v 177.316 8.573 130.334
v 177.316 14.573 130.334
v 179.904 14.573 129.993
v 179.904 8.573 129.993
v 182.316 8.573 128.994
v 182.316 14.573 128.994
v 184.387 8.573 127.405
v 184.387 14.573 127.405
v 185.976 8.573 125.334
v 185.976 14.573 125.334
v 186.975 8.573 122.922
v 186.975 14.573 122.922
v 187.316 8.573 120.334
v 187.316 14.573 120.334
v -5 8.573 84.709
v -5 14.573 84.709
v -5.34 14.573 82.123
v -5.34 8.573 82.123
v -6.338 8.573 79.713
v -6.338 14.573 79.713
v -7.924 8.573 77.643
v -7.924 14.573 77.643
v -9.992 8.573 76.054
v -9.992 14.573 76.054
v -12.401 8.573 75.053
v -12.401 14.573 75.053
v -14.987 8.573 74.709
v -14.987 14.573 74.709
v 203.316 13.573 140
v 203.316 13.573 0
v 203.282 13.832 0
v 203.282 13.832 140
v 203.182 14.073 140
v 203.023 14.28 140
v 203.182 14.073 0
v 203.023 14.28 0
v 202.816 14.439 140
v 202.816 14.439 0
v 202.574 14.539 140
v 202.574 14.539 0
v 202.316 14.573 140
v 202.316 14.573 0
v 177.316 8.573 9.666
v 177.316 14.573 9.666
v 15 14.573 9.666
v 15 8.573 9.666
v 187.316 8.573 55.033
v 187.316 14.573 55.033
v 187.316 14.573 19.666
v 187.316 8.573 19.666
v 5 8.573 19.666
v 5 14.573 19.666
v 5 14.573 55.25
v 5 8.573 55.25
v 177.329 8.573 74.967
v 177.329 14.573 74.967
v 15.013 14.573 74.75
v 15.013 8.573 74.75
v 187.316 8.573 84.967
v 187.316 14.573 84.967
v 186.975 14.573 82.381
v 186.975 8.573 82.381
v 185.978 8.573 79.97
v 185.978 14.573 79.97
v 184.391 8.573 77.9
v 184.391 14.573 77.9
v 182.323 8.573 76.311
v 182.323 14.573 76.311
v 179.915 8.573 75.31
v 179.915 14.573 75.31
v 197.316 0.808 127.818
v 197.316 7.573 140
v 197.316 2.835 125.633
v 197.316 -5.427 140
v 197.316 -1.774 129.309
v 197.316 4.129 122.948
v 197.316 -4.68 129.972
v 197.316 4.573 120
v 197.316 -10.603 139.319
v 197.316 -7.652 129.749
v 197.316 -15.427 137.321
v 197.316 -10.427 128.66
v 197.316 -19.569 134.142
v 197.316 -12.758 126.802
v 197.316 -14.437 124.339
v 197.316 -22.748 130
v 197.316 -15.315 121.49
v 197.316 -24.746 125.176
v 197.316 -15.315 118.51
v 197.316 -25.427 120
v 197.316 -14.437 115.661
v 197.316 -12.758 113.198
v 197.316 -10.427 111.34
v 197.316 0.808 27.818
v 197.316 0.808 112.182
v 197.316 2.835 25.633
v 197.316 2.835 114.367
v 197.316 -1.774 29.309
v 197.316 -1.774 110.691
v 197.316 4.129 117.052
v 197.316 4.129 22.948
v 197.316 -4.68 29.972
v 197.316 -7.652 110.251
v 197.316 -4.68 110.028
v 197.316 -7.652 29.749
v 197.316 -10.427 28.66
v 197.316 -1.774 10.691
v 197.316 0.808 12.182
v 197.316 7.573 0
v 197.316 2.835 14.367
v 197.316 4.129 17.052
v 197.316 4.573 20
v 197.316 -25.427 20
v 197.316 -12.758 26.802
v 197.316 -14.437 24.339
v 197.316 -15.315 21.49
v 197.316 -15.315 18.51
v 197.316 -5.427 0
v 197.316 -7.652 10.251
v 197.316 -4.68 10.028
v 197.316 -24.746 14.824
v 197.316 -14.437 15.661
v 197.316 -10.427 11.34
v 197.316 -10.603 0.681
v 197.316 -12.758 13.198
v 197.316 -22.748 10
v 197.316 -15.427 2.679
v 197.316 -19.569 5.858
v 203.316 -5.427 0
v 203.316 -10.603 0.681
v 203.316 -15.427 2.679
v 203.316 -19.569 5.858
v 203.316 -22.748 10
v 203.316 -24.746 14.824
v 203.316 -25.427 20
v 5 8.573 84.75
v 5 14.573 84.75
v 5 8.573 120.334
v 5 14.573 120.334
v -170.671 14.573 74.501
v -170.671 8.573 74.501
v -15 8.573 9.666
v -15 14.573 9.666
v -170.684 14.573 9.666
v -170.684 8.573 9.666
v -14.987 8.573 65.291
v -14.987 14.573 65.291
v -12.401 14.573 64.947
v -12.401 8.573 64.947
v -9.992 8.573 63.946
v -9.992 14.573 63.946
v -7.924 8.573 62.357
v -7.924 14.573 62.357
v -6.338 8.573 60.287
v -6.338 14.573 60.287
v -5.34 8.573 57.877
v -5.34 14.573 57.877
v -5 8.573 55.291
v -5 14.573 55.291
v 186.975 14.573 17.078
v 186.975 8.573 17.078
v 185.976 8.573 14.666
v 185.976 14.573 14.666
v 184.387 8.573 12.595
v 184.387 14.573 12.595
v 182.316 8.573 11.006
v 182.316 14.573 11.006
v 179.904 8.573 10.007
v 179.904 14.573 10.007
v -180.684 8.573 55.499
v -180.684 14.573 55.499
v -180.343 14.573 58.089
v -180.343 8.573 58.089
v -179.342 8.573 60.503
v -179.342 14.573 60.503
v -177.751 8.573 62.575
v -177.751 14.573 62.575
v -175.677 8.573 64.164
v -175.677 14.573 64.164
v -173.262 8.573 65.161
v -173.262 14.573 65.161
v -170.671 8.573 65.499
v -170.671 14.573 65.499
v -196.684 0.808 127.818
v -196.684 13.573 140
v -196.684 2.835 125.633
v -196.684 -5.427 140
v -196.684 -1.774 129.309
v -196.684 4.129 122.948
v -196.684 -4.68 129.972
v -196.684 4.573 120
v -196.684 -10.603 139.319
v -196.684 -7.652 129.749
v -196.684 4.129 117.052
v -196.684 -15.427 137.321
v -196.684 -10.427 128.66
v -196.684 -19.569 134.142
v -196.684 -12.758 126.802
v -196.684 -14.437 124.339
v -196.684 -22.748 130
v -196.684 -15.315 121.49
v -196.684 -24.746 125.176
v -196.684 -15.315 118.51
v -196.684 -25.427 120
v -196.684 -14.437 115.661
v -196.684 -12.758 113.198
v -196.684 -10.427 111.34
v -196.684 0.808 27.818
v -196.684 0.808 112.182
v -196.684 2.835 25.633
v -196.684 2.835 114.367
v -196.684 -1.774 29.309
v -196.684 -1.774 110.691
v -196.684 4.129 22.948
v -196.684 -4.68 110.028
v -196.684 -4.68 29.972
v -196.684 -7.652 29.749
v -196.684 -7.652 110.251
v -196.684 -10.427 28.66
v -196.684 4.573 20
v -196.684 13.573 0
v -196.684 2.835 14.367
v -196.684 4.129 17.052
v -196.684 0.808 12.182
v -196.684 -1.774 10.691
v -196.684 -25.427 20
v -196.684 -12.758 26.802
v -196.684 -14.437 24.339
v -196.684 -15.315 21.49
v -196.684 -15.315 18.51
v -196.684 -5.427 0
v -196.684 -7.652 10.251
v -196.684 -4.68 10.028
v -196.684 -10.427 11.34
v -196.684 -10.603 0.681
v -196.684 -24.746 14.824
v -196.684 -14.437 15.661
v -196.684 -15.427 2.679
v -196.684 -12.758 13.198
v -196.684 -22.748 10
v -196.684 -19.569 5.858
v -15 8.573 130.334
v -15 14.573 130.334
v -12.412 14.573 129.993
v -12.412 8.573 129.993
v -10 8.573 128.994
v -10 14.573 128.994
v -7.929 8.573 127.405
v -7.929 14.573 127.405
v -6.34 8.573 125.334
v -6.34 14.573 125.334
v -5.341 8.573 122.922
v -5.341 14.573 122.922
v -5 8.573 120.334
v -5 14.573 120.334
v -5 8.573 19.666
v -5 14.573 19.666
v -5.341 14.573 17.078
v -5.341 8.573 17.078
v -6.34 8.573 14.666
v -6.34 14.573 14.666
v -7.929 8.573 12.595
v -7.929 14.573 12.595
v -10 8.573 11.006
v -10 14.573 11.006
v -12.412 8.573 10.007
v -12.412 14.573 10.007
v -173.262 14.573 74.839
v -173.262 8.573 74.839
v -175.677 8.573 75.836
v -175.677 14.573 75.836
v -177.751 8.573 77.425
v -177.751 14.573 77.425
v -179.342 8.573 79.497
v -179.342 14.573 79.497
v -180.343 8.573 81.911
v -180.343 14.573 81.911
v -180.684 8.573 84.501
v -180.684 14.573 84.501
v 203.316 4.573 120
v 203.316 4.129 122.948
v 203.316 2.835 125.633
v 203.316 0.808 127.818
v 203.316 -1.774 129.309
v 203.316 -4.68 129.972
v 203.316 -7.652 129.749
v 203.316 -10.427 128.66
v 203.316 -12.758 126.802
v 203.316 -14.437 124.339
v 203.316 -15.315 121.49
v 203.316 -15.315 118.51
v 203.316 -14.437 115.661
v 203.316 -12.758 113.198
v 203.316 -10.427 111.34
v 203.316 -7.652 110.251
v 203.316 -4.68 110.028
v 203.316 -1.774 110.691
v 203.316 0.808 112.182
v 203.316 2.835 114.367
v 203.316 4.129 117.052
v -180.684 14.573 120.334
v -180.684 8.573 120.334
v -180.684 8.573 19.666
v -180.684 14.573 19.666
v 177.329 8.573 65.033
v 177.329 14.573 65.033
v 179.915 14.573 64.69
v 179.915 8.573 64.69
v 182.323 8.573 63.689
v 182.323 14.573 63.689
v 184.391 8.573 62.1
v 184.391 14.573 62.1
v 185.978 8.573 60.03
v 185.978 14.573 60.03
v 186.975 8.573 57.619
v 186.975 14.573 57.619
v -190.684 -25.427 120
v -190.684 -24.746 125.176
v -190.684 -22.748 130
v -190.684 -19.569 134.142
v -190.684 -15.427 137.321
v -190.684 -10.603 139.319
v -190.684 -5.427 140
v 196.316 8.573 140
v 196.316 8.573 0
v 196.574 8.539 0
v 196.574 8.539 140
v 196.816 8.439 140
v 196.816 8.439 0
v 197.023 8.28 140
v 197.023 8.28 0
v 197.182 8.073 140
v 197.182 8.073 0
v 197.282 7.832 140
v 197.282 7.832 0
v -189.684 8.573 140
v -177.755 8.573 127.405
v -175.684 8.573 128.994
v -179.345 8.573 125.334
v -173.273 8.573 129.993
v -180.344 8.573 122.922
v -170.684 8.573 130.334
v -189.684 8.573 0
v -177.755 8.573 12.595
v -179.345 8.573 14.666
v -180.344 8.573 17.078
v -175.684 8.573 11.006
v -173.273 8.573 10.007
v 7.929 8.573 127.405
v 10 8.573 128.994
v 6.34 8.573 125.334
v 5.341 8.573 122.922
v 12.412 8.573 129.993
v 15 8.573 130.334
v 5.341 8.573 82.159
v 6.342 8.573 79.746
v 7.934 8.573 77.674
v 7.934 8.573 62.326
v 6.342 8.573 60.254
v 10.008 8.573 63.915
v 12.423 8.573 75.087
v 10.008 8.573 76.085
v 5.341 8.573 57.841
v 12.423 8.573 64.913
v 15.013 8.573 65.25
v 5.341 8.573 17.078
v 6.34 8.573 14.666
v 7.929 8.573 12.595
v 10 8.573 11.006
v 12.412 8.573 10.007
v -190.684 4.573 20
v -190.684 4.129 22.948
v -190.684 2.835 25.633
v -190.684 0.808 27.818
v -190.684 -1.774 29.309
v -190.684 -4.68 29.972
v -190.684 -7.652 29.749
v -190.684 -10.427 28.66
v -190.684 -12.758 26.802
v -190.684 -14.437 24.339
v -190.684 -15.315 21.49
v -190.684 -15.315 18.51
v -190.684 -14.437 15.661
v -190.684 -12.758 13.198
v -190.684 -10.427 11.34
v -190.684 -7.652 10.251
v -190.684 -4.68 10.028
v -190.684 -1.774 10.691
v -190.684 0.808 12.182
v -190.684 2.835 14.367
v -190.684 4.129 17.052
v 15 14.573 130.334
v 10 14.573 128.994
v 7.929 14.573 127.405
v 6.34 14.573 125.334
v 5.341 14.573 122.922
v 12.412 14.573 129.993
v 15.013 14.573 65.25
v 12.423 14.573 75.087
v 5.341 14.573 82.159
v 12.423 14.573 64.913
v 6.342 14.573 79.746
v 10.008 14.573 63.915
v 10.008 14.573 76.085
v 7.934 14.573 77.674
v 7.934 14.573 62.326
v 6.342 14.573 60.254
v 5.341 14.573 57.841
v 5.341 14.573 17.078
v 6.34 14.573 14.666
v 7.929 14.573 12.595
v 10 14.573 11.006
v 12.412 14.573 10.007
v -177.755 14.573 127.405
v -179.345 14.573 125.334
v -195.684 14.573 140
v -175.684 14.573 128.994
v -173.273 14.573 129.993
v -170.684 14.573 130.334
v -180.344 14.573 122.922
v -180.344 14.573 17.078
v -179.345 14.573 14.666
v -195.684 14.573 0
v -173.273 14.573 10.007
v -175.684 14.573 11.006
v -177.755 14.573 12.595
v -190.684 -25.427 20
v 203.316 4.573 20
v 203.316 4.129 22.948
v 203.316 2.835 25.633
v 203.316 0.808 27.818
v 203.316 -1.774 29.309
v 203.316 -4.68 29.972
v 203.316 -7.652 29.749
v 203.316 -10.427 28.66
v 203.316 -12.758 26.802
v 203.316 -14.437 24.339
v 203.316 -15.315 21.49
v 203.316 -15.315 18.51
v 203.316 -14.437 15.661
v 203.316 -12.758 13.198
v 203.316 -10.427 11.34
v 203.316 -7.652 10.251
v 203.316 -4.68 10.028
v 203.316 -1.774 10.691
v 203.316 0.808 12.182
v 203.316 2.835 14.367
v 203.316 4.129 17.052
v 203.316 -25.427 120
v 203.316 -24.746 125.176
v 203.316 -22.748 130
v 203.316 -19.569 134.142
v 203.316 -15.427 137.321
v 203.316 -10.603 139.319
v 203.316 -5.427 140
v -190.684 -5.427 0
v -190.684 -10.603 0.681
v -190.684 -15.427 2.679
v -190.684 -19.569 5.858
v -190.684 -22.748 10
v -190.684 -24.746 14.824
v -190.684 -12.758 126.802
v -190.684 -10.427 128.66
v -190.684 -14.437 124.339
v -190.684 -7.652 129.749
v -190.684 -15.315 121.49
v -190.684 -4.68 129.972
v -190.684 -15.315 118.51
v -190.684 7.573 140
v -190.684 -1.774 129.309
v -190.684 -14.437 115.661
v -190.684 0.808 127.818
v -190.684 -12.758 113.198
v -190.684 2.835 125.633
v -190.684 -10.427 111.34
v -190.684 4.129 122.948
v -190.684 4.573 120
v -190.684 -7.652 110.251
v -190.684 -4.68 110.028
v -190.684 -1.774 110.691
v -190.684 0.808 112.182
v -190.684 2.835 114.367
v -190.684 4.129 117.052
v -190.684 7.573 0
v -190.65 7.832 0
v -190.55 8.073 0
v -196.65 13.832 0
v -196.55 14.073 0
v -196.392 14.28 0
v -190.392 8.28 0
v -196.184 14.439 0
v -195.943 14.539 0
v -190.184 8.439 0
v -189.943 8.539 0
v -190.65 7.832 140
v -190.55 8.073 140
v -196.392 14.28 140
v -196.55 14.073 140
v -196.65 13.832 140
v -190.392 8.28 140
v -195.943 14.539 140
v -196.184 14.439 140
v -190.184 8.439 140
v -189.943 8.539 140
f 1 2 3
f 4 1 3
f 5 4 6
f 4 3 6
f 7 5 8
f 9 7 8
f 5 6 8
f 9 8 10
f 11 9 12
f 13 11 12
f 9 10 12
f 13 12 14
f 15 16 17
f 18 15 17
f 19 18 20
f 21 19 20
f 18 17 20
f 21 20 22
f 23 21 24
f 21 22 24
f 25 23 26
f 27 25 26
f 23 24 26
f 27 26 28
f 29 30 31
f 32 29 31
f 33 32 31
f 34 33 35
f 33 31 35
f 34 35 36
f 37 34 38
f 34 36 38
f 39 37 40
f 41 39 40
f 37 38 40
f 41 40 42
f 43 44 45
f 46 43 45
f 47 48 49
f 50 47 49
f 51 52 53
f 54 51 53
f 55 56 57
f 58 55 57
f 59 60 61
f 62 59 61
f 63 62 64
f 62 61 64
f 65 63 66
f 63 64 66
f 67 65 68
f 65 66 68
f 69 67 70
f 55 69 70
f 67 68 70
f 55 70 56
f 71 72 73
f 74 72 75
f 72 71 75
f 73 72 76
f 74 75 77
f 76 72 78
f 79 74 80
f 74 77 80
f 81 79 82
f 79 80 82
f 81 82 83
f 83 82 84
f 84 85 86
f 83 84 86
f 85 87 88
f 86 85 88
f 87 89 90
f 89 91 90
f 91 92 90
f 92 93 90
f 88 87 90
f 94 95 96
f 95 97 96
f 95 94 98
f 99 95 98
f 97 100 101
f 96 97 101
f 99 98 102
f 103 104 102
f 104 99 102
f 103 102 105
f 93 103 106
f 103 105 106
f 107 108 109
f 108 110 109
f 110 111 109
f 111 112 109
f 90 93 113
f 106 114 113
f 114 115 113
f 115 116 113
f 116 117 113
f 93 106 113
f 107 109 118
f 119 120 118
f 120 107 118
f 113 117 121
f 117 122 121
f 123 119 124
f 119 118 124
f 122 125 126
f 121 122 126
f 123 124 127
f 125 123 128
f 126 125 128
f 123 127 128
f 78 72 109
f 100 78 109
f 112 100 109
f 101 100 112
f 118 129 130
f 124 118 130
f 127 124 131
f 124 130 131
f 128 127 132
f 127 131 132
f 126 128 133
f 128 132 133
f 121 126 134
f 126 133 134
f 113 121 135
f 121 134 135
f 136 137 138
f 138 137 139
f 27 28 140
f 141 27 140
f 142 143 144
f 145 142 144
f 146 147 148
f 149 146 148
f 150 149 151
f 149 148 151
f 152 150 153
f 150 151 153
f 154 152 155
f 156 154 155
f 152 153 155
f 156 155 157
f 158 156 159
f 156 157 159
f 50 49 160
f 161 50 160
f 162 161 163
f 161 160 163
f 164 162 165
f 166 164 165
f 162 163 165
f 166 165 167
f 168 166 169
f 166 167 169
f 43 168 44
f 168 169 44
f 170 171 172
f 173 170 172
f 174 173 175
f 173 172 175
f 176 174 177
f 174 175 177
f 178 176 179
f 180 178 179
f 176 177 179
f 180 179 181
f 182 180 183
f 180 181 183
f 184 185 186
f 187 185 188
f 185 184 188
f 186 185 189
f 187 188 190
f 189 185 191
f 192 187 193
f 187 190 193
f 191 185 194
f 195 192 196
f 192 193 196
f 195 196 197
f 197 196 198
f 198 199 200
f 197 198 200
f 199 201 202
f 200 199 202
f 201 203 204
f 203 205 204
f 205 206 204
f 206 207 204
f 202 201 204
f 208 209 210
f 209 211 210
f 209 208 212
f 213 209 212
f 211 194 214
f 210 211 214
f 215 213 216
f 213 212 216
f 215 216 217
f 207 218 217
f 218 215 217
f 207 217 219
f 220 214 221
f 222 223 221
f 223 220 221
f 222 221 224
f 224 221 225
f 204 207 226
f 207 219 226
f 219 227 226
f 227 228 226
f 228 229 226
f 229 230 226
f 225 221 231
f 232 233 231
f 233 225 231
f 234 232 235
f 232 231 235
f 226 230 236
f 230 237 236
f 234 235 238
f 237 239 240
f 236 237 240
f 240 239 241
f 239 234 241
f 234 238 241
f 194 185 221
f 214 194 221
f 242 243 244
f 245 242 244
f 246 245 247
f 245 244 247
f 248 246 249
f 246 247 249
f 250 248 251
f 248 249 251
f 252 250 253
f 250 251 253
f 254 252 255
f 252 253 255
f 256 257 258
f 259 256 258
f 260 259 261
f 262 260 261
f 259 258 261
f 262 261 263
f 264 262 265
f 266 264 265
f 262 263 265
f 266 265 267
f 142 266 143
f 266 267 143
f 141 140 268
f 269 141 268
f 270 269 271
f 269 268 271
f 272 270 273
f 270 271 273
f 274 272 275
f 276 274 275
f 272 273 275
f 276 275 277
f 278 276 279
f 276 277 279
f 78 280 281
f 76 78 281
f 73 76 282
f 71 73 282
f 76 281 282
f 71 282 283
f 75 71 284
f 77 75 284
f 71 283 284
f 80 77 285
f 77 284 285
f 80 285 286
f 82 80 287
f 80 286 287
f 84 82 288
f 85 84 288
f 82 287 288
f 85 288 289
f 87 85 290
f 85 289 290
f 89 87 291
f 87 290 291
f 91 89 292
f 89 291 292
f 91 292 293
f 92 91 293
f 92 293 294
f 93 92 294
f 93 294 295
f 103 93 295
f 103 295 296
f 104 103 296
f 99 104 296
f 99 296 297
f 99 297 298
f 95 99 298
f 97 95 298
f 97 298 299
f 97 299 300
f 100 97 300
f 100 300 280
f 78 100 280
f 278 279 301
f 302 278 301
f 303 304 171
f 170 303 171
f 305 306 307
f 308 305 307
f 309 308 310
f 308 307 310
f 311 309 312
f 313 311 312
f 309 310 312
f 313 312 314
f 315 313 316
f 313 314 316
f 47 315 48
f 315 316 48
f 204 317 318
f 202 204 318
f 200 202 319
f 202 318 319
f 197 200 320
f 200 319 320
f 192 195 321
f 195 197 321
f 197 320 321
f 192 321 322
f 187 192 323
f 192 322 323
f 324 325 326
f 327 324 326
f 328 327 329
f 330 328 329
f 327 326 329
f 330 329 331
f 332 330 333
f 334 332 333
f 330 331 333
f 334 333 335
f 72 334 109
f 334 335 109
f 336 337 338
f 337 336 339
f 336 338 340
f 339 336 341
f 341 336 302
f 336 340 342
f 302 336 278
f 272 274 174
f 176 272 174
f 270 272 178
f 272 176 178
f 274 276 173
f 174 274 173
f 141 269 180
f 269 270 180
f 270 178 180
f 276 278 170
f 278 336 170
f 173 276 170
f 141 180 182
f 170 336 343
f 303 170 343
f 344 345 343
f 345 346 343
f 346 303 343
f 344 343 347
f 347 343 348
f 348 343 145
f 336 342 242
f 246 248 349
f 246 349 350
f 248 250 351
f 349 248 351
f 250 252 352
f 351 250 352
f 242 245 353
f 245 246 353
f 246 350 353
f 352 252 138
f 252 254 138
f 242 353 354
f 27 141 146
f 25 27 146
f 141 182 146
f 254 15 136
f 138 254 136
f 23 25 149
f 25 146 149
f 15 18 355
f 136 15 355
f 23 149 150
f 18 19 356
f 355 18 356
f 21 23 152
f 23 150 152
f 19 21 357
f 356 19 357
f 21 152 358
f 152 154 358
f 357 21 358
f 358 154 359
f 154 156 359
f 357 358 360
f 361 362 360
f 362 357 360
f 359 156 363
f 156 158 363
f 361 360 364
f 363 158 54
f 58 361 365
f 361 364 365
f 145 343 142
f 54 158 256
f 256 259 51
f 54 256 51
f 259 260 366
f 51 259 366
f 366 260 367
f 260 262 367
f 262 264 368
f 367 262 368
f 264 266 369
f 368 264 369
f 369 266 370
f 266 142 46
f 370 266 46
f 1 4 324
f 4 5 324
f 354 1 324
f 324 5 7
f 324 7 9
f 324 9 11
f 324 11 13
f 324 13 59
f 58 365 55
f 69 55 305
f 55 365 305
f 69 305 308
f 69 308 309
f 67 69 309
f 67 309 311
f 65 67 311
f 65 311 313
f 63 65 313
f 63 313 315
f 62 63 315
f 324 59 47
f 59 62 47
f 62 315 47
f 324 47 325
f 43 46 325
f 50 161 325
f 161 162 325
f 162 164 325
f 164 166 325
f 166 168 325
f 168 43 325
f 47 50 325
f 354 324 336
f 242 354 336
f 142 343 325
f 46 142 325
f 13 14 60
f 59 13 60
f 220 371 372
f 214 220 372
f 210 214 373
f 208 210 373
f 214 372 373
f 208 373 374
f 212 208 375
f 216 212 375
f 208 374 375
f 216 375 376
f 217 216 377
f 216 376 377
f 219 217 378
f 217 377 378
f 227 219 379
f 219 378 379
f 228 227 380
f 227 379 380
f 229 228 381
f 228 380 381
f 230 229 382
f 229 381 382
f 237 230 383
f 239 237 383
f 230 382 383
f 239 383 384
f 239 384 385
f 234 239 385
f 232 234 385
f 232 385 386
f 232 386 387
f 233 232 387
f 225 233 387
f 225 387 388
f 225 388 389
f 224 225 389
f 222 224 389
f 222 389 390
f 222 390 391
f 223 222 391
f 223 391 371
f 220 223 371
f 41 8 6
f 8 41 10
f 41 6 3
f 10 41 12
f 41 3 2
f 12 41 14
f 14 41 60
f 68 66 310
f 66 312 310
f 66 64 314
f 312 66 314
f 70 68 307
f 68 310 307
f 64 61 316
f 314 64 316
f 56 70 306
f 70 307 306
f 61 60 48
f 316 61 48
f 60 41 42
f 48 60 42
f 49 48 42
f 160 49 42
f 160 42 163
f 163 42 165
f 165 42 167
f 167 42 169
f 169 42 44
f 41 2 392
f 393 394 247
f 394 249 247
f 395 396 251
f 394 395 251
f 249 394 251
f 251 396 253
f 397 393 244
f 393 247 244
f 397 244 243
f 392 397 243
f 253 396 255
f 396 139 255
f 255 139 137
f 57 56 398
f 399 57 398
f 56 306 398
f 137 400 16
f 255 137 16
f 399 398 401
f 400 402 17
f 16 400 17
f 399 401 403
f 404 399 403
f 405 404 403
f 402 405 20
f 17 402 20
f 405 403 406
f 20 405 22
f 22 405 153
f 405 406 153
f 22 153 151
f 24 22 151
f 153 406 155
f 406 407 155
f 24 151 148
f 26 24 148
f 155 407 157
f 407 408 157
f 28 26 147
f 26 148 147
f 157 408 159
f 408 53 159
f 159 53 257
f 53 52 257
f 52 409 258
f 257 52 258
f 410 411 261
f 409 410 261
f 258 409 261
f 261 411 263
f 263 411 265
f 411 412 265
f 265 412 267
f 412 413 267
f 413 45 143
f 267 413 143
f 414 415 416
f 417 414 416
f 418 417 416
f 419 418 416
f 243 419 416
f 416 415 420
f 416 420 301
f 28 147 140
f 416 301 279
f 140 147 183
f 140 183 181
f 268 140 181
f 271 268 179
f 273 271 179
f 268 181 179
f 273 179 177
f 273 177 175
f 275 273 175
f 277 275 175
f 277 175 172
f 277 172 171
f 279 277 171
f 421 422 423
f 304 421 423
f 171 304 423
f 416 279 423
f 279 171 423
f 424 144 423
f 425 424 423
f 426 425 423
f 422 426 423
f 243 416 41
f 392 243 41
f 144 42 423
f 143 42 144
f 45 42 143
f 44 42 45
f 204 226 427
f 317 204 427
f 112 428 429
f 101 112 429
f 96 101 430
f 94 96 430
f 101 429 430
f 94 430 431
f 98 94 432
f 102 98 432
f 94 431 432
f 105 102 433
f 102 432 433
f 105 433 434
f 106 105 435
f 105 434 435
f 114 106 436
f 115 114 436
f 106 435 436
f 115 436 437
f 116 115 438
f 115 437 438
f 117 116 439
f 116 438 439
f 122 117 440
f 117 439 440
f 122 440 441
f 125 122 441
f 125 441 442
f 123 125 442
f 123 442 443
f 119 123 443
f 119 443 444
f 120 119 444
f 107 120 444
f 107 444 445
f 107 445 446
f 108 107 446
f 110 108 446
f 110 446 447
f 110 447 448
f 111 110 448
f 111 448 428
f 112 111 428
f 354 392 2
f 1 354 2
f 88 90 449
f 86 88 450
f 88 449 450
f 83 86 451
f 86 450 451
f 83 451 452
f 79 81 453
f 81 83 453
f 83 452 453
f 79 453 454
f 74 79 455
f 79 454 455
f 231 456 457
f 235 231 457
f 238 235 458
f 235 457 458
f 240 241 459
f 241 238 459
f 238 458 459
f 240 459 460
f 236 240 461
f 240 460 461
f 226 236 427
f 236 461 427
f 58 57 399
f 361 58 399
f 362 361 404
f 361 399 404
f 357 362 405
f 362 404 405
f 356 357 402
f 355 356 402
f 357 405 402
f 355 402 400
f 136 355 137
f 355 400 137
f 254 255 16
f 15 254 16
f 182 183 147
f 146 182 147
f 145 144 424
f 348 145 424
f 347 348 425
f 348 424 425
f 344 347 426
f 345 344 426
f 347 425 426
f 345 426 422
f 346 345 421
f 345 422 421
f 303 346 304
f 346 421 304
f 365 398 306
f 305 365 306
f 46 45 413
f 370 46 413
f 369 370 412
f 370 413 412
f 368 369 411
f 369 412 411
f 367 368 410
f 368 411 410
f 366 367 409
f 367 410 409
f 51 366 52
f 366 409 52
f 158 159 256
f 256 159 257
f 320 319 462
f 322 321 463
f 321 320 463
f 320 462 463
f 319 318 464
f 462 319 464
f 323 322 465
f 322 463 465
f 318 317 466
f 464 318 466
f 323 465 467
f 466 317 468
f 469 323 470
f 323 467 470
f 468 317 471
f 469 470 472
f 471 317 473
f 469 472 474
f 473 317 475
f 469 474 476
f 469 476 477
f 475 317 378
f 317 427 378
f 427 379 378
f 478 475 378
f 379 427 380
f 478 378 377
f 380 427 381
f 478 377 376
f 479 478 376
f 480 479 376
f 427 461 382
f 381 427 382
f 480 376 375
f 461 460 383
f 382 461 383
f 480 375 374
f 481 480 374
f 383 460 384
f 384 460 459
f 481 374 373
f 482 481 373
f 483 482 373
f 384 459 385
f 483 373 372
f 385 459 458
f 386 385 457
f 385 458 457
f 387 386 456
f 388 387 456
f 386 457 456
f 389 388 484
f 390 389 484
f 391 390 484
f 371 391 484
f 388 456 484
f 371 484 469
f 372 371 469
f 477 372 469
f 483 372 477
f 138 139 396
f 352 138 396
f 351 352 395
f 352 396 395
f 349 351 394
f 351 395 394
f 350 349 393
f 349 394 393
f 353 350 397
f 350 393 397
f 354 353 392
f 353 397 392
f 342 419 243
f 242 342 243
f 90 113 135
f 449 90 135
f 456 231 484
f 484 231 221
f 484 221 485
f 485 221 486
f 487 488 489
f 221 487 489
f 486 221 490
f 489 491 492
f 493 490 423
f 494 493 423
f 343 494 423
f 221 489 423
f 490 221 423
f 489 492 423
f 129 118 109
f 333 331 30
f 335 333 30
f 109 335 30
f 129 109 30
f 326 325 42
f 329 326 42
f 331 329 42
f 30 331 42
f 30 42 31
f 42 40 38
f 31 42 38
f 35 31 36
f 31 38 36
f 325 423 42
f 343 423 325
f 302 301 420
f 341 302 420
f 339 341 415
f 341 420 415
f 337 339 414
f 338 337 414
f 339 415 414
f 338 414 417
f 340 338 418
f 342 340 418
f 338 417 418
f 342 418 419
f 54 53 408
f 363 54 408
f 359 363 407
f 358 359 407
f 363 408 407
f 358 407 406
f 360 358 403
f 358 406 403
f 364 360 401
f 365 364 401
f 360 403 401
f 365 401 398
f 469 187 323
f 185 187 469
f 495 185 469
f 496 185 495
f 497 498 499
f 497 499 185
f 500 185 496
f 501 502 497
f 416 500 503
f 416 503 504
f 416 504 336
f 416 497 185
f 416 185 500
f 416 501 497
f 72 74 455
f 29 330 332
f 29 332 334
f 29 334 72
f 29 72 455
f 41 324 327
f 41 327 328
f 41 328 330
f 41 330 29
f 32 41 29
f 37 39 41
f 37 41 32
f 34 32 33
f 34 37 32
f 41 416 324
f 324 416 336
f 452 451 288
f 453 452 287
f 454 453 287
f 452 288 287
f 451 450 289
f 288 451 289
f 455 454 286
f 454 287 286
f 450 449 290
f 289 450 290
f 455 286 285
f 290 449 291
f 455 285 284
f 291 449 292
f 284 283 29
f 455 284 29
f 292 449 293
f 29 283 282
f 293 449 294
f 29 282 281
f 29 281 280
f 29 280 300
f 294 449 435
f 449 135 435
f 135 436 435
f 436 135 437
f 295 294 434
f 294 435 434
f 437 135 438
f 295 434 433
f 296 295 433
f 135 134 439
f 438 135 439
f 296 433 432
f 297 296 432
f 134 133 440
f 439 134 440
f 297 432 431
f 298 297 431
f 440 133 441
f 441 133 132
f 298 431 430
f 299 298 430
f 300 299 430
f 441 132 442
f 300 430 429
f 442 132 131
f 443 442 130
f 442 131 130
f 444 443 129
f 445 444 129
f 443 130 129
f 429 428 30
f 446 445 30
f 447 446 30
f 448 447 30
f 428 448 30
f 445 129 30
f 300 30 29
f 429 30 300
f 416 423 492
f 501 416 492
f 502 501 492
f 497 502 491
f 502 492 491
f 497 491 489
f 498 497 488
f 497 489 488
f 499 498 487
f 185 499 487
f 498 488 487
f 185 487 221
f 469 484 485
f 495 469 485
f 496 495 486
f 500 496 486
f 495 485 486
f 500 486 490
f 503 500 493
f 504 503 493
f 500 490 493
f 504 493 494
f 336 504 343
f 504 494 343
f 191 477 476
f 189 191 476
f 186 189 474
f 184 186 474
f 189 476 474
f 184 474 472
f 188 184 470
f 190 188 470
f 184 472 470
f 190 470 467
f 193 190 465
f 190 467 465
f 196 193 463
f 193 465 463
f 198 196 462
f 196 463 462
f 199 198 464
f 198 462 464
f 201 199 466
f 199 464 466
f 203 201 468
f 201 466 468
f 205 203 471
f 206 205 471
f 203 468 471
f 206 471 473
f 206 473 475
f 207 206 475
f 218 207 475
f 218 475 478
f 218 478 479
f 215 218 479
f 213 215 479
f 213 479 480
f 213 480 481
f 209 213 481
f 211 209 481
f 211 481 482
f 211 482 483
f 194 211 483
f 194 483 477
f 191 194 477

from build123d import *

# Parameters (mm, degrees)
F1_DEPTH = 140
F2_R     = 10
F3_DEPTH = 400.001
F5_DEPTH = 40.001


with BuildPart() as f1:
    # F0 (on Top) → F1 (new body)
    with BuildSketch(Plane.XY):
        with BuildLine():
            Line((202.315605, 14.572916), (-195.684395, 14.572916))
            ThreePointArc((-195.684395, 14.572916), (-196.391502, 14.280022), (-196.684395, 13.572916))
            Line((-196.684395, 13.572916), (-196.684395, -25.427084))
            Line((-196.684395, -25.427084), (-190.684395, -25.427084))
            Line((-190.684395, -25.427084), (-190.684395, 7.572916))
            ThreePointArc((-190.684395, 7.572916), (-190.391502, 8.280022), (-189.684395, 8.572916))
            Line((-189.684395, 8.572916), (196.315605, 8.572916))
            ThreePointArc((196.315605, 8.572916), (197.022712, 8.280022), (197.315605, 7.572916))
            Line((197.315605, 7.572916), (197.315605, -25.427084))
            Line((197.315605, -25.427084), (203.315605, -25.427084))
            Line((203.315605, -25.427084), (203.315605, 13.572916))
            ThreePointArc((203.315605, 13.572916), (203.022712, 14.280022), (202.315605, 14.572916))
        make_face()
    extrude(amount=F1_DEPTH)

    # F2 (on face) → F3 (cut, through all)
    with BuildSketch(Plane.YZ.offset(203.315605)):
        with BuildLine():
            Line((3.824211, 140.531208), (-66.175789, 140.531208))
            Line((-66.175789, 140.531208), (-66.175789, -19.468792))
            Line((-66.175789, -19.468792), (3.824211, -19.468792))
            Line((3.824211, -19.468792), (3.824211, 0))
            Line((3.824211, 0), (-5.427084, 0))
            ThreePointArc((-5.427084, 0), (-19.56922, 5.857864), (-25.427084, 20))
            Line((-25.427084, 20), (-25.427084, 120))
            ThreePointArc((-25.427084, 120), (-19.56922, 134.142136), (-5.427084, 140))
            Line((-5.427084, 140), (3.824211, 140))
            Line((3.824211, 140), (3.824211, 140.531208))
        make_face()
        with Locations((-5.427084, 20)):
            Circle(F2_R)
        with Locations((-5.427084, 120)):
            Circle(F2_R)
    extrude(amount=-F3_DEPTH, mode=Mode.SUBTRACT)

    # F4 (on face) → F5 (cut, through all)
    with BuildSketch(Plane(origin=(0, 14.572916, 0), x_dir=(-1, 0, 0), z_dir=(0, 1, 0))):
        with BuildLine():
            ThreePointArc((-187.315605, 84.966576), (-184.3914, 77.900238), (-177.328978, 74.966585))
            Line((-177.328978, 74.966585), (-15.013373, 74.749518))
            ThreePointArc((-15.013373, 74.749518), (-7.933662, 77.673715), (-5, 84.749509))
            Line((-5, 84.749509), (-5, 120.333677))
            ThreePointArc((-5, 120.333677), (-7.928932, 127.404745), (-15, 130.333677))
            Line((-15, 130.333677), (-177.315605, 130.333677))
            ThreePointArc((-177.315605, 130.333677), (-184.386673, 127.404745), (-187.315605, 120.333677))
            Line((-187.315605, 120.333677), (-187.315605, 84.966576))
        make_face()
        with BuildLine():
            Line((180.684395, 84.50119), (180.684395, 120.333677))
            ThreePointArc((180.684395, 120.333677), (177.755463, 127.404745), (170.684395, 130.333677))
            Line((170.684395, 130.333677), (15, 130.333677))
            ThreePointArc((15, 130.333677), (7.928932, 127.404745), (5, 120.333677))
            Line((5, 120.333677), (5, 84.709389))
            ThreePointArc((5, 84.709389), (7.924206, 77.643051), (14.986627, 74.709398))
            Line((14.986627, 74.709398), (170.671022, 74.501199))
            ThreePointArc((170.671022, 74.501199), (177.750733, 77.425396), (180.684395, 84.50119))
        make_face()
        with BuildLine():
            ThreePointArc((-187.315605, 19.666323), (-184.386673, 12.595255), (-177.315605, 9.666323))
            Line((-177.315605, 9.666323), (-15, 9.666323))
            ThreePointArc((-15, 9.666323), (-7.928932, 12.595255), (-5, 19.666323))
            Line((-5, 19.666323), (-5, 55.250491))
            ThreePointArc((-5, 55.250491), (-7.933662, 62.326285), (-15.013373, 65.250482))
            Line((-15.013373, 65.250482), (-177.328978, 65.033415))
            ThreePointArc((-177.328978, 65.033415), (-184.3914, 62.099762), (-187.315605, 55.033424))
            Line((-187.315605, 55.033424), (-187.315605, 19.666323))
        make_face()
        with BuildLine():
            ThreePointArc((5, 19.666323), (7.928932, 12.595255), (15, 9.666323))
            Line((15, 9.666323), (170.684395, 9.666323))
            ThreePointArc((170.684395, 9.666323), (177.755463, 12.595255), (180.684395, 19.666323))
            Line((180.684395, 19.666323), (180.684395, 55.49881))
            ThreePointArc((180.684395, 55.49881), (177.750733, 62.574604), (170.671022, 65.498801))
            Line((170.671022, 65.498801), (14.986627, 65.290602))
            ThreePointArc((14.986627, 65.290602), (7.924206, 62.356949), (5, 55.290611))
            Line((5, 55.290611), (5, 19.666323))
        make_face()
    extrude(amount=-F5_DEPTH, mode=Mode.SUBTRACT)


solid = f1.part
